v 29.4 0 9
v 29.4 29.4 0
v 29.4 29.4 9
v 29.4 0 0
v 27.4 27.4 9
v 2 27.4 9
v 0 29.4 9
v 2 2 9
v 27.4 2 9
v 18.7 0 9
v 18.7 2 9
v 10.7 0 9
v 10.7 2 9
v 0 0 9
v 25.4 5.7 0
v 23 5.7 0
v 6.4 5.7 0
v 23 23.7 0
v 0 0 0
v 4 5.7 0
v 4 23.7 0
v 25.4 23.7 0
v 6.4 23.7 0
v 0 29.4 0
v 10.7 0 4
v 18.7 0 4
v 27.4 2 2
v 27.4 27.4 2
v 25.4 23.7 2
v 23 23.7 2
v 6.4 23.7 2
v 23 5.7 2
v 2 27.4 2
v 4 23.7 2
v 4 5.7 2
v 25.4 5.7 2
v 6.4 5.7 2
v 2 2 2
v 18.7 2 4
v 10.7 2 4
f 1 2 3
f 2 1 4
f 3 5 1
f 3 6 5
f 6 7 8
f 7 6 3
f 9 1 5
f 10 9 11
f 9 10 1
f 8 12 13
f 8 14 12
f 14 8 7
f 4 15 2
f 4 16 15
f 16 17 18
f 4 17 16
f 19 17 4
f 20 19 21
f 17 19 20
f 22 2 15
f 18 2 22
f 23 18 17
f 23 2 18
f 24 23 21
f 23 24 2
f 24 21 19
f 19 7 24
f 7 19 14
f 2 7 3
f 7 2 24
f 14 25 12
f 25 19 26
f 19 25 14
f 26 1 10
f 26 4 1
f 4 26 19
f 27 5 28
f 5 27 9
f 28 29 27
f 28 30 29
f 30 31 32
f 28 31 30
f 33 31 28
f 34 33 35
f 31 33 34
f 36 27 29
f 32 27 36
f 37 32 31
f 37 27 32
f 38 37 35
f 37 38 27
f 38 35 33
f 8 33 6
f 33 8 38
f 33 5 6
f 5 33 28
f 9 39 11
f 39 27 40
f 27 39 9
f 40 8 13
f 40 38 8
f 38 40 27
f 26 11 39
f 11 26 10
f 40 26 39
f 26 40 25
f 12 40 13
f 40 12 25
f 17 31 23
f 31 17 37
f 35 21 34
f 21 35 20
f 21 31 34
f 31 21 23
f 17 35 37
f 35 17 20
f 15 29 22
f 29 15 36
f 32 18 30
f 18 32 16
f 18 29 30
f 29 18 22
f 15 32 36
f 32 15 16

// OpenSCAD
// Original MechIntel educational model. CC0-1.0. Units: mm.
// Not a standardized or load-rated component.
$fn=96;
inner=25.4;
wall=2;
floor=2;
rim=7;
slot=2.4;
$fn=64;
difference(){
 union(){
  translate([0,0,0]) cube([inner+2*wall,inner+2*wall,floor+rim]);
 }
 translate([wall,wall,floor]) cube([inner,inner,rim+1]);
 translate([inner/2+wall-4,-1,floor+2]) cube([8,wall+2,rim]);
 translate([wall+2,(inner+2*wall-18)/2,-1]) cube([slot,18,floor+1]);
 translate([inner+wall-2-slot,(inner+2*wall-18)/2,-1]) cube([slot,18,floor+1]);
}
